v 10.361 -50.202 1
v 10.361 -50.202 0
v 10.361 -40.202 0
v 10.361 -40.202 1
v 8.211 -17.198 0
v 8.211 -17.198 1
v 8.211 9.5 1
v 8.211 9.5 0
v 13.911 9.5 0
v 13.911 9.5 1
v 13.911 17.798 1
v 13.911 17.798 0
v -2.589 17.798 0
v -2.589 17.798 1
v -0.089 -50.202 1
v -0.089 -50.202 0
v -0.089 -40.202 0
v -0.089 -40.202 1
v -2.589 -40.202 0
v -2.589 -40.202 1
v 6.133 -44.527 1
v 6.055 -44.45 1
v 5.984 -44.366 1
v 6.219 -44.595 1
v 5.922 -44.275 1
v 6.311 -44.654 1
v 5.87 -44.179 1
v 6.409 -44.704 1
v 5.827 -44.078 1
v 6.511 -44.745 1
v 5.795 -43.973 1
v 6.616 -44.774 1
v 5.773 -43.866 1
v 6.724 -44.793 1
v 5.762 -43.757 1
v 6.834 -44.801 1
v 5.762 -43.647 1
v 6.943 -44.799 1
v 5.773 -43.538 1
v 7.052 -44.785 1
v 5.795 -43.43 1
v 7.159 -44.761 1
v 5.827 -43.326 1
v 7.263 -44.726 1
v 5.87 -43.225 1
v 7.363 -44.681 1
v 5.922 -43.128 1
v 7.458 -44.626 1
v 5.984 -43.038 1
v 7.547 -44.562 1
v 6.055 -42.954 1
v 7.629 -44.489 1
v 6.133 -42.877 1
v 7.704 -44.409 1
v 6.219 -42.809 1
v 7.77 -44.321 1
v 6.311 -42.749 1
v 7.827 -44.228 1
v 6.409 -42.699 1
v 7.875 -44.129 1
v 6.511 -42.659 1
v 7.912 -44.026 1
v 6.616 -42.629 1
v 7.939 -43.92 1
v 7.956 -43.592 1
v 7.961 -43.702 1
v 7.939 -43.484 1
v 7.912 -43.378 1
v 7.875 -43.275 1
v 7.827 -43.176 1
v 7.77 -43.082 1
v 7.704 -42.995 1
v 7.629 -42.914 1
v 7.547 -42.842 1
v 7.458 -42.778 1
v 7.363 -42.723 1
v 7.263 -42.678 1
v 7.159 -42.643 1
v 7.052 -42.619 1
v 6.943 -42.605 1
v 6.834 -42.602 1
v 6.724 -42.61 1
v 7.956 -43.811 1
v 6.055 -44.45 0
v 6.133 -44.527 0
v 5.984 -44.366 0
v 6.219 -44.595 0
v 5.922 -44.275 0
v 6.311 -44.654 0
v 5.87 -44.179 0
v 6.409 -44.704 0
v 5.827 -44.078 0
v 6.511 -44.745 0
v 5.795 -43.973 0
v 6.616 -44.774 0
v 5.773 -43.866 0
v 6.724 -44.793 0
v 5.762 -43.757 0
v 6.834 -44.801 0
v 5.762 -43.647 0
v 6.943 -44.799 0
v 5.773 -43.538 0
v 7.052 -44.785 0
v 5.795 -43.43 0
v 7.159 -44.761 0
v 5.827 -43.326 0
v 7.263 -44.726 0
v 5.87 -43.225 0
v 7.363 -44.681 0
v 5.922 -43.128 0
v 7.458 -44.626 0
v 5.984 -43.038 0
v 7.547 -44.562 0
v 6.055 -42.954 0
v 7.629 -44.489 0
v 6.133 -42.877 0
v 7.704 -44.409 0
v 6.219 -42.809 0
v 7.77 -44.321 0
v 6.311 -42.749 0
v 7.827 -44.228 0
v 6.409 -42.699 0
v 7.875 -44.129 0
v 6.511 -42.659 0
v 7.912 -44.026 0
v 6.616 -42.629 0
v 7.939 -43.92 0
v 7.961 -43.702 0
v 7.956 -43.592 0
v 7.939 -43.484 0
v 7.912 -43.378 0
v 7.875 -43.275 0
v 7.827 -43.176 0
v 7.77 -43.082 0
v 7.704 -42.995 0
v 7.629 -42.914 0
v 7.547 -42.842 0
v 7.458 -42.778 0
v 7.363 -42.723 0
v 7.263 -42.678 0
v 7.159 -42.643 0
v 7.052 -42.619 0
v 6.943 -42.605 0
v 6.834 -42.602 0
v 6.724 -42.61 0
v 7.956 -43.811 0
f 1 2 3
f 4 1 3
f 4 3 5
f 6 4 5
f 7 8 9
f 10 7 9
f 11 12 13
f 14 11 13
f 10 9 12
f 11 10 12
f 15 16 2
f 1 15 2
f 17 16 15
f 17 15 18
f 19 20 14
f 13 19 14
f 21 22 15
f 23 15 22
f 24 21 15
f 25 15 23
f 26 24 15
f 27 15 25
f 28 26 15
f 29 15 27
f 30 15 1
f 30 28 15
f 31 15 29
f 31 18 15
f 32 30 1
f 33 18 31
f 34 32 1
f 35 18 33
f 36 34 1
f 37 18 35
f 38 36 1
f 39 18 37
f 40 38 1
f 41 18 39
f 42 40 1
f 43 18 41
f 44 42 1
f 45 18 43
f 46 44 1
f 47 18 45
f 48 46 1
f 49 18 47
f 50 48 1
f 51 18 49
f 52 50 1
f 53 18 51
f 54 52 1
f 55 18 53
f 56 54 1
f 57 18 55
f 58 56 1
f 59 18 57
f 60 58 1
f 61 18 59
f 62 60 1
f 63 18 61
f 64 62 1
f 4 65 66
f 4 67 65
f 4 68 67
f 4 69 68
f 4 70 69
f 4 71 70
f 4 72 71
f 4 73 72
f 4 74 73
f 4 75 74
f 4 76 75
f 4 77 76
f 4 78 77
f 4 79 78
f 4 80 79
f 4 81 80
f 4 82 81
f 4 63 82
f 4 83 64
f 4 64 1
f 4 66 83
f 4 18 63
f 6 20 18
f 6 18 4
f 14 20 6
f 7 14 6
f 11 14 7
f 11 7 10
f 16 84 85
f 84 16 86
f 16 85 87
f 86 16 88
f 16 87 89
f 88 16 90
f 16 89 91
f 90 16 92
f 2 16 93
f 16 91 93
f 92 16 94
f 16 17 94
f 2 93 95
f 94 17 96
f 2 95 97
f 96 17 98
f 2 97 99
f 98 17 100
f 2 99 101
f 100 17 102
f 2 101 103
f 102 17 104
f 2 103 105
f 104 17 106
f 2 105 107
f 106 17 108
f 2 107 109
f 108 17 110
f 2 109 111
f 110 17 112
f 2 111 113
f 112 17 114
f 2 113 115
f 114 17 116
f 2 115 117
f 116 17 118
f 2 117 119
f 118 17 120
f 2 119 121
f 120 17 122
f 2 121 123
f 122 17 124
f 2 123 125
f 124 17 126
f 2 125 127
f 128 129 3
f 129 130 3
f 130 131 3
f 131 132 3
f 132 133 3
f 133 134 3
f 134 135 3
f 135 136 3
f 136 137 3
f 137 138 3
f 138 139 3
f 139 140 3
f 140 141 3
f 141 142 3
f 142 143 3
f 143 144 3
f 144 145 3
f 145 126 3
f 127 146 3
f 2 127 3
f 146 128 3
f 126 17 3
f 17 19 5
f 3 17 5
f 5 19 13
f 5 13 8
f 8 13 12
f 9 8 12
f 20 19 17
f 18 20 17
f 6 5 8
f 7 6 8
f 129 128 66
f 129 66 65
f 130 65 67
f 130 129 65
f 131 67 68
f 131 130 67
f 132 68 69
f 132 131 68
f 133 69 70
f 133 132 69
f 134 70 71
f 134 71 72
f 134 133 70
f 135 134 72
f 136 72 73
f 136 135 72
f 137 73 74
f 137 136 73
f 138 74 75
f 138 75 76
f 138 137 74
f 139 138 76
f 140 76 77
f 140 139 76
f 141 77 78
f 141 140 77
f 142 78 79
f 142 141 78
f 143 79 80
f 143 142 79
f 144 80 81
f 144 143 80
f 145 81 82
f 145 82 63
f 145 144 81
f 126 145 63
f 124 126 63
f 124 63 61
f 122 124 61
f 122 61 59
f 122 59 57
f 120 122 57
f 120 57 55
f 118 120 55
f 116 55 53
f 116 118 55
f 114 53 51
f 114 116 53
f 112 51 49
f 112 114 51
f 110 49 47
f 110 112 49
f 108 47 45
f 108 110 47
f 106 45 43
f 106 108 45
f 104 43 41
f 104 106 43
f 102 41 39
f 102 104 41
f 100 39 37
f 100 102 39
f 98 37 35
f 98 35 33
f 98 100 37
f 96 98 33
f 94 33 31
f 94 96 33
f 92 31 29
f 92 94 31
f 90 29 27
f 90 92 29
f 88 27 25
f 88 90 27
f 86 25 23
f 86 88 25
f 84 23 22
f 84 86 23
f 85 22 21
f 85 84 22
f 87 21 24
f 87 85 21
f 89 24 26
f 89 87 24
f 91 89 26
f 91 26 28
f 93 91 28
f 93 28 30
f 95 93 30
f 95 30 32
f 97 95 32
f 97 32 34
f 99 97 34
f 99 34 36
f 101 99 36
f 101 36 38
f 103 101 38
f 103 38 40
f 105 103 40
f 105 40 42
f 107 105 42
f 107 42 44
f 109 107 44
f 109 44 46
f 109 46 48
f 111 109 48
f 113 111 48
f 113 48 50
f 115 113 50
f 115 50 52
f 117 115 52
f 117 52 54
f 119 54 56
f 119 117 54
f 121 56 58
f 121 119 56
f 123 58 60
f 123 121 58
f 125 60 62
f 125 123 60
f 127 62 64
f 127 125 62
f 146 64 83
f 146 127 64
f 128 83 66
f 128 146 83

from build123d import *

# Parameters (mm, degrees)
EXTRUDE_2_DEPTH     = 1
SKETCH_1_5_W        = 5.5
SKETCH_1_5_H        = 10
SKETCH_1_5_W_2      = 4.949873967
SKETCH_1_5_R        = 1.1
EXTRUDE_3_DEPTH     = 1
SKETCH_3_W          = 3
SKETCH_3_H          = 58
CUT_EXTRUDE_1_DEPTH = 10


with BuildPart() as part:
    # 草图1 → 凸台-拉伸2 (new body)
    with BuildSketch(Plane.XY):
        Polygon((-5.588804059, 13.118731113), (-5.588804059, -12.701827406), (-5.588804059, -40.201827406), (-0.088804059, -40.201827406), (5.411195941, -40.201827406), (10.361069908, -40.201827406), (8.211195941, -17.197725842), (8.211195941, 9.5), (13.911195941, 9.5), (13.911195941, 12.5), (13.911195941, 17.798172594), (-5.588804059, 17.798172594), align=None)
    extrude(amount=EXTRUDE_2_DEPTH)

    # 草图1<5> → 凸台-拉伸3 (add)
    # profile 1 of 3: a face of its own
    with BuildSketch(Plane.XY):
        Polygon((-5.588804059, 13.118731113), (-5.588804059, -12.701827406), (-5.588804059, -40.201827406), (-0.088804059, -40.201827406), (5.411195941, -40.201827406), (10.361069908, -40.201827406), (8.211195941, -17.197725842), (8.211195941, 9.5), (13.911195941, 9.5), (13.911195941, 12.5), (13.911195941, 17.798172594), (-5.588804059, 17.798172594), align=None)
    # profile 2 of 3: a face of its own
    with BuildSketch(Plane.XY):
        with Locations((2.661195941, -45.201827406)):
            Rectangle(SKETCH_1_5_W, SKETCH_1_5_H)
    # profile 3 of 3: a face of its own
    with BuildSketch(Plane.XY):
        with Locations((7.886132925, -45.201827406)):
            Rectangle(SKETCH_1_5_W_2, SKETCH_1_5_H)
        with Locations((6.861069908, -43.701827406)):
            Circle(SKETCH_1_5_R, mode=Mode.SUBTRACT)
    extrude(amount=EXTRUDE_3_DEPTH)

    # 草图3 → 切除-拉伸1 (cut)
    with BuildSketch(Plane.XY.offset(1)):
        with Locations((-4.088804059, -11.201827406)):
            Rectangle(SKETCH_3_W, SKETCH_3_H)
    extrude(amount=-CUT_EXTRUDE_1_DEPTH, mode=Mode.SUBTRACT)


solid = part.part
